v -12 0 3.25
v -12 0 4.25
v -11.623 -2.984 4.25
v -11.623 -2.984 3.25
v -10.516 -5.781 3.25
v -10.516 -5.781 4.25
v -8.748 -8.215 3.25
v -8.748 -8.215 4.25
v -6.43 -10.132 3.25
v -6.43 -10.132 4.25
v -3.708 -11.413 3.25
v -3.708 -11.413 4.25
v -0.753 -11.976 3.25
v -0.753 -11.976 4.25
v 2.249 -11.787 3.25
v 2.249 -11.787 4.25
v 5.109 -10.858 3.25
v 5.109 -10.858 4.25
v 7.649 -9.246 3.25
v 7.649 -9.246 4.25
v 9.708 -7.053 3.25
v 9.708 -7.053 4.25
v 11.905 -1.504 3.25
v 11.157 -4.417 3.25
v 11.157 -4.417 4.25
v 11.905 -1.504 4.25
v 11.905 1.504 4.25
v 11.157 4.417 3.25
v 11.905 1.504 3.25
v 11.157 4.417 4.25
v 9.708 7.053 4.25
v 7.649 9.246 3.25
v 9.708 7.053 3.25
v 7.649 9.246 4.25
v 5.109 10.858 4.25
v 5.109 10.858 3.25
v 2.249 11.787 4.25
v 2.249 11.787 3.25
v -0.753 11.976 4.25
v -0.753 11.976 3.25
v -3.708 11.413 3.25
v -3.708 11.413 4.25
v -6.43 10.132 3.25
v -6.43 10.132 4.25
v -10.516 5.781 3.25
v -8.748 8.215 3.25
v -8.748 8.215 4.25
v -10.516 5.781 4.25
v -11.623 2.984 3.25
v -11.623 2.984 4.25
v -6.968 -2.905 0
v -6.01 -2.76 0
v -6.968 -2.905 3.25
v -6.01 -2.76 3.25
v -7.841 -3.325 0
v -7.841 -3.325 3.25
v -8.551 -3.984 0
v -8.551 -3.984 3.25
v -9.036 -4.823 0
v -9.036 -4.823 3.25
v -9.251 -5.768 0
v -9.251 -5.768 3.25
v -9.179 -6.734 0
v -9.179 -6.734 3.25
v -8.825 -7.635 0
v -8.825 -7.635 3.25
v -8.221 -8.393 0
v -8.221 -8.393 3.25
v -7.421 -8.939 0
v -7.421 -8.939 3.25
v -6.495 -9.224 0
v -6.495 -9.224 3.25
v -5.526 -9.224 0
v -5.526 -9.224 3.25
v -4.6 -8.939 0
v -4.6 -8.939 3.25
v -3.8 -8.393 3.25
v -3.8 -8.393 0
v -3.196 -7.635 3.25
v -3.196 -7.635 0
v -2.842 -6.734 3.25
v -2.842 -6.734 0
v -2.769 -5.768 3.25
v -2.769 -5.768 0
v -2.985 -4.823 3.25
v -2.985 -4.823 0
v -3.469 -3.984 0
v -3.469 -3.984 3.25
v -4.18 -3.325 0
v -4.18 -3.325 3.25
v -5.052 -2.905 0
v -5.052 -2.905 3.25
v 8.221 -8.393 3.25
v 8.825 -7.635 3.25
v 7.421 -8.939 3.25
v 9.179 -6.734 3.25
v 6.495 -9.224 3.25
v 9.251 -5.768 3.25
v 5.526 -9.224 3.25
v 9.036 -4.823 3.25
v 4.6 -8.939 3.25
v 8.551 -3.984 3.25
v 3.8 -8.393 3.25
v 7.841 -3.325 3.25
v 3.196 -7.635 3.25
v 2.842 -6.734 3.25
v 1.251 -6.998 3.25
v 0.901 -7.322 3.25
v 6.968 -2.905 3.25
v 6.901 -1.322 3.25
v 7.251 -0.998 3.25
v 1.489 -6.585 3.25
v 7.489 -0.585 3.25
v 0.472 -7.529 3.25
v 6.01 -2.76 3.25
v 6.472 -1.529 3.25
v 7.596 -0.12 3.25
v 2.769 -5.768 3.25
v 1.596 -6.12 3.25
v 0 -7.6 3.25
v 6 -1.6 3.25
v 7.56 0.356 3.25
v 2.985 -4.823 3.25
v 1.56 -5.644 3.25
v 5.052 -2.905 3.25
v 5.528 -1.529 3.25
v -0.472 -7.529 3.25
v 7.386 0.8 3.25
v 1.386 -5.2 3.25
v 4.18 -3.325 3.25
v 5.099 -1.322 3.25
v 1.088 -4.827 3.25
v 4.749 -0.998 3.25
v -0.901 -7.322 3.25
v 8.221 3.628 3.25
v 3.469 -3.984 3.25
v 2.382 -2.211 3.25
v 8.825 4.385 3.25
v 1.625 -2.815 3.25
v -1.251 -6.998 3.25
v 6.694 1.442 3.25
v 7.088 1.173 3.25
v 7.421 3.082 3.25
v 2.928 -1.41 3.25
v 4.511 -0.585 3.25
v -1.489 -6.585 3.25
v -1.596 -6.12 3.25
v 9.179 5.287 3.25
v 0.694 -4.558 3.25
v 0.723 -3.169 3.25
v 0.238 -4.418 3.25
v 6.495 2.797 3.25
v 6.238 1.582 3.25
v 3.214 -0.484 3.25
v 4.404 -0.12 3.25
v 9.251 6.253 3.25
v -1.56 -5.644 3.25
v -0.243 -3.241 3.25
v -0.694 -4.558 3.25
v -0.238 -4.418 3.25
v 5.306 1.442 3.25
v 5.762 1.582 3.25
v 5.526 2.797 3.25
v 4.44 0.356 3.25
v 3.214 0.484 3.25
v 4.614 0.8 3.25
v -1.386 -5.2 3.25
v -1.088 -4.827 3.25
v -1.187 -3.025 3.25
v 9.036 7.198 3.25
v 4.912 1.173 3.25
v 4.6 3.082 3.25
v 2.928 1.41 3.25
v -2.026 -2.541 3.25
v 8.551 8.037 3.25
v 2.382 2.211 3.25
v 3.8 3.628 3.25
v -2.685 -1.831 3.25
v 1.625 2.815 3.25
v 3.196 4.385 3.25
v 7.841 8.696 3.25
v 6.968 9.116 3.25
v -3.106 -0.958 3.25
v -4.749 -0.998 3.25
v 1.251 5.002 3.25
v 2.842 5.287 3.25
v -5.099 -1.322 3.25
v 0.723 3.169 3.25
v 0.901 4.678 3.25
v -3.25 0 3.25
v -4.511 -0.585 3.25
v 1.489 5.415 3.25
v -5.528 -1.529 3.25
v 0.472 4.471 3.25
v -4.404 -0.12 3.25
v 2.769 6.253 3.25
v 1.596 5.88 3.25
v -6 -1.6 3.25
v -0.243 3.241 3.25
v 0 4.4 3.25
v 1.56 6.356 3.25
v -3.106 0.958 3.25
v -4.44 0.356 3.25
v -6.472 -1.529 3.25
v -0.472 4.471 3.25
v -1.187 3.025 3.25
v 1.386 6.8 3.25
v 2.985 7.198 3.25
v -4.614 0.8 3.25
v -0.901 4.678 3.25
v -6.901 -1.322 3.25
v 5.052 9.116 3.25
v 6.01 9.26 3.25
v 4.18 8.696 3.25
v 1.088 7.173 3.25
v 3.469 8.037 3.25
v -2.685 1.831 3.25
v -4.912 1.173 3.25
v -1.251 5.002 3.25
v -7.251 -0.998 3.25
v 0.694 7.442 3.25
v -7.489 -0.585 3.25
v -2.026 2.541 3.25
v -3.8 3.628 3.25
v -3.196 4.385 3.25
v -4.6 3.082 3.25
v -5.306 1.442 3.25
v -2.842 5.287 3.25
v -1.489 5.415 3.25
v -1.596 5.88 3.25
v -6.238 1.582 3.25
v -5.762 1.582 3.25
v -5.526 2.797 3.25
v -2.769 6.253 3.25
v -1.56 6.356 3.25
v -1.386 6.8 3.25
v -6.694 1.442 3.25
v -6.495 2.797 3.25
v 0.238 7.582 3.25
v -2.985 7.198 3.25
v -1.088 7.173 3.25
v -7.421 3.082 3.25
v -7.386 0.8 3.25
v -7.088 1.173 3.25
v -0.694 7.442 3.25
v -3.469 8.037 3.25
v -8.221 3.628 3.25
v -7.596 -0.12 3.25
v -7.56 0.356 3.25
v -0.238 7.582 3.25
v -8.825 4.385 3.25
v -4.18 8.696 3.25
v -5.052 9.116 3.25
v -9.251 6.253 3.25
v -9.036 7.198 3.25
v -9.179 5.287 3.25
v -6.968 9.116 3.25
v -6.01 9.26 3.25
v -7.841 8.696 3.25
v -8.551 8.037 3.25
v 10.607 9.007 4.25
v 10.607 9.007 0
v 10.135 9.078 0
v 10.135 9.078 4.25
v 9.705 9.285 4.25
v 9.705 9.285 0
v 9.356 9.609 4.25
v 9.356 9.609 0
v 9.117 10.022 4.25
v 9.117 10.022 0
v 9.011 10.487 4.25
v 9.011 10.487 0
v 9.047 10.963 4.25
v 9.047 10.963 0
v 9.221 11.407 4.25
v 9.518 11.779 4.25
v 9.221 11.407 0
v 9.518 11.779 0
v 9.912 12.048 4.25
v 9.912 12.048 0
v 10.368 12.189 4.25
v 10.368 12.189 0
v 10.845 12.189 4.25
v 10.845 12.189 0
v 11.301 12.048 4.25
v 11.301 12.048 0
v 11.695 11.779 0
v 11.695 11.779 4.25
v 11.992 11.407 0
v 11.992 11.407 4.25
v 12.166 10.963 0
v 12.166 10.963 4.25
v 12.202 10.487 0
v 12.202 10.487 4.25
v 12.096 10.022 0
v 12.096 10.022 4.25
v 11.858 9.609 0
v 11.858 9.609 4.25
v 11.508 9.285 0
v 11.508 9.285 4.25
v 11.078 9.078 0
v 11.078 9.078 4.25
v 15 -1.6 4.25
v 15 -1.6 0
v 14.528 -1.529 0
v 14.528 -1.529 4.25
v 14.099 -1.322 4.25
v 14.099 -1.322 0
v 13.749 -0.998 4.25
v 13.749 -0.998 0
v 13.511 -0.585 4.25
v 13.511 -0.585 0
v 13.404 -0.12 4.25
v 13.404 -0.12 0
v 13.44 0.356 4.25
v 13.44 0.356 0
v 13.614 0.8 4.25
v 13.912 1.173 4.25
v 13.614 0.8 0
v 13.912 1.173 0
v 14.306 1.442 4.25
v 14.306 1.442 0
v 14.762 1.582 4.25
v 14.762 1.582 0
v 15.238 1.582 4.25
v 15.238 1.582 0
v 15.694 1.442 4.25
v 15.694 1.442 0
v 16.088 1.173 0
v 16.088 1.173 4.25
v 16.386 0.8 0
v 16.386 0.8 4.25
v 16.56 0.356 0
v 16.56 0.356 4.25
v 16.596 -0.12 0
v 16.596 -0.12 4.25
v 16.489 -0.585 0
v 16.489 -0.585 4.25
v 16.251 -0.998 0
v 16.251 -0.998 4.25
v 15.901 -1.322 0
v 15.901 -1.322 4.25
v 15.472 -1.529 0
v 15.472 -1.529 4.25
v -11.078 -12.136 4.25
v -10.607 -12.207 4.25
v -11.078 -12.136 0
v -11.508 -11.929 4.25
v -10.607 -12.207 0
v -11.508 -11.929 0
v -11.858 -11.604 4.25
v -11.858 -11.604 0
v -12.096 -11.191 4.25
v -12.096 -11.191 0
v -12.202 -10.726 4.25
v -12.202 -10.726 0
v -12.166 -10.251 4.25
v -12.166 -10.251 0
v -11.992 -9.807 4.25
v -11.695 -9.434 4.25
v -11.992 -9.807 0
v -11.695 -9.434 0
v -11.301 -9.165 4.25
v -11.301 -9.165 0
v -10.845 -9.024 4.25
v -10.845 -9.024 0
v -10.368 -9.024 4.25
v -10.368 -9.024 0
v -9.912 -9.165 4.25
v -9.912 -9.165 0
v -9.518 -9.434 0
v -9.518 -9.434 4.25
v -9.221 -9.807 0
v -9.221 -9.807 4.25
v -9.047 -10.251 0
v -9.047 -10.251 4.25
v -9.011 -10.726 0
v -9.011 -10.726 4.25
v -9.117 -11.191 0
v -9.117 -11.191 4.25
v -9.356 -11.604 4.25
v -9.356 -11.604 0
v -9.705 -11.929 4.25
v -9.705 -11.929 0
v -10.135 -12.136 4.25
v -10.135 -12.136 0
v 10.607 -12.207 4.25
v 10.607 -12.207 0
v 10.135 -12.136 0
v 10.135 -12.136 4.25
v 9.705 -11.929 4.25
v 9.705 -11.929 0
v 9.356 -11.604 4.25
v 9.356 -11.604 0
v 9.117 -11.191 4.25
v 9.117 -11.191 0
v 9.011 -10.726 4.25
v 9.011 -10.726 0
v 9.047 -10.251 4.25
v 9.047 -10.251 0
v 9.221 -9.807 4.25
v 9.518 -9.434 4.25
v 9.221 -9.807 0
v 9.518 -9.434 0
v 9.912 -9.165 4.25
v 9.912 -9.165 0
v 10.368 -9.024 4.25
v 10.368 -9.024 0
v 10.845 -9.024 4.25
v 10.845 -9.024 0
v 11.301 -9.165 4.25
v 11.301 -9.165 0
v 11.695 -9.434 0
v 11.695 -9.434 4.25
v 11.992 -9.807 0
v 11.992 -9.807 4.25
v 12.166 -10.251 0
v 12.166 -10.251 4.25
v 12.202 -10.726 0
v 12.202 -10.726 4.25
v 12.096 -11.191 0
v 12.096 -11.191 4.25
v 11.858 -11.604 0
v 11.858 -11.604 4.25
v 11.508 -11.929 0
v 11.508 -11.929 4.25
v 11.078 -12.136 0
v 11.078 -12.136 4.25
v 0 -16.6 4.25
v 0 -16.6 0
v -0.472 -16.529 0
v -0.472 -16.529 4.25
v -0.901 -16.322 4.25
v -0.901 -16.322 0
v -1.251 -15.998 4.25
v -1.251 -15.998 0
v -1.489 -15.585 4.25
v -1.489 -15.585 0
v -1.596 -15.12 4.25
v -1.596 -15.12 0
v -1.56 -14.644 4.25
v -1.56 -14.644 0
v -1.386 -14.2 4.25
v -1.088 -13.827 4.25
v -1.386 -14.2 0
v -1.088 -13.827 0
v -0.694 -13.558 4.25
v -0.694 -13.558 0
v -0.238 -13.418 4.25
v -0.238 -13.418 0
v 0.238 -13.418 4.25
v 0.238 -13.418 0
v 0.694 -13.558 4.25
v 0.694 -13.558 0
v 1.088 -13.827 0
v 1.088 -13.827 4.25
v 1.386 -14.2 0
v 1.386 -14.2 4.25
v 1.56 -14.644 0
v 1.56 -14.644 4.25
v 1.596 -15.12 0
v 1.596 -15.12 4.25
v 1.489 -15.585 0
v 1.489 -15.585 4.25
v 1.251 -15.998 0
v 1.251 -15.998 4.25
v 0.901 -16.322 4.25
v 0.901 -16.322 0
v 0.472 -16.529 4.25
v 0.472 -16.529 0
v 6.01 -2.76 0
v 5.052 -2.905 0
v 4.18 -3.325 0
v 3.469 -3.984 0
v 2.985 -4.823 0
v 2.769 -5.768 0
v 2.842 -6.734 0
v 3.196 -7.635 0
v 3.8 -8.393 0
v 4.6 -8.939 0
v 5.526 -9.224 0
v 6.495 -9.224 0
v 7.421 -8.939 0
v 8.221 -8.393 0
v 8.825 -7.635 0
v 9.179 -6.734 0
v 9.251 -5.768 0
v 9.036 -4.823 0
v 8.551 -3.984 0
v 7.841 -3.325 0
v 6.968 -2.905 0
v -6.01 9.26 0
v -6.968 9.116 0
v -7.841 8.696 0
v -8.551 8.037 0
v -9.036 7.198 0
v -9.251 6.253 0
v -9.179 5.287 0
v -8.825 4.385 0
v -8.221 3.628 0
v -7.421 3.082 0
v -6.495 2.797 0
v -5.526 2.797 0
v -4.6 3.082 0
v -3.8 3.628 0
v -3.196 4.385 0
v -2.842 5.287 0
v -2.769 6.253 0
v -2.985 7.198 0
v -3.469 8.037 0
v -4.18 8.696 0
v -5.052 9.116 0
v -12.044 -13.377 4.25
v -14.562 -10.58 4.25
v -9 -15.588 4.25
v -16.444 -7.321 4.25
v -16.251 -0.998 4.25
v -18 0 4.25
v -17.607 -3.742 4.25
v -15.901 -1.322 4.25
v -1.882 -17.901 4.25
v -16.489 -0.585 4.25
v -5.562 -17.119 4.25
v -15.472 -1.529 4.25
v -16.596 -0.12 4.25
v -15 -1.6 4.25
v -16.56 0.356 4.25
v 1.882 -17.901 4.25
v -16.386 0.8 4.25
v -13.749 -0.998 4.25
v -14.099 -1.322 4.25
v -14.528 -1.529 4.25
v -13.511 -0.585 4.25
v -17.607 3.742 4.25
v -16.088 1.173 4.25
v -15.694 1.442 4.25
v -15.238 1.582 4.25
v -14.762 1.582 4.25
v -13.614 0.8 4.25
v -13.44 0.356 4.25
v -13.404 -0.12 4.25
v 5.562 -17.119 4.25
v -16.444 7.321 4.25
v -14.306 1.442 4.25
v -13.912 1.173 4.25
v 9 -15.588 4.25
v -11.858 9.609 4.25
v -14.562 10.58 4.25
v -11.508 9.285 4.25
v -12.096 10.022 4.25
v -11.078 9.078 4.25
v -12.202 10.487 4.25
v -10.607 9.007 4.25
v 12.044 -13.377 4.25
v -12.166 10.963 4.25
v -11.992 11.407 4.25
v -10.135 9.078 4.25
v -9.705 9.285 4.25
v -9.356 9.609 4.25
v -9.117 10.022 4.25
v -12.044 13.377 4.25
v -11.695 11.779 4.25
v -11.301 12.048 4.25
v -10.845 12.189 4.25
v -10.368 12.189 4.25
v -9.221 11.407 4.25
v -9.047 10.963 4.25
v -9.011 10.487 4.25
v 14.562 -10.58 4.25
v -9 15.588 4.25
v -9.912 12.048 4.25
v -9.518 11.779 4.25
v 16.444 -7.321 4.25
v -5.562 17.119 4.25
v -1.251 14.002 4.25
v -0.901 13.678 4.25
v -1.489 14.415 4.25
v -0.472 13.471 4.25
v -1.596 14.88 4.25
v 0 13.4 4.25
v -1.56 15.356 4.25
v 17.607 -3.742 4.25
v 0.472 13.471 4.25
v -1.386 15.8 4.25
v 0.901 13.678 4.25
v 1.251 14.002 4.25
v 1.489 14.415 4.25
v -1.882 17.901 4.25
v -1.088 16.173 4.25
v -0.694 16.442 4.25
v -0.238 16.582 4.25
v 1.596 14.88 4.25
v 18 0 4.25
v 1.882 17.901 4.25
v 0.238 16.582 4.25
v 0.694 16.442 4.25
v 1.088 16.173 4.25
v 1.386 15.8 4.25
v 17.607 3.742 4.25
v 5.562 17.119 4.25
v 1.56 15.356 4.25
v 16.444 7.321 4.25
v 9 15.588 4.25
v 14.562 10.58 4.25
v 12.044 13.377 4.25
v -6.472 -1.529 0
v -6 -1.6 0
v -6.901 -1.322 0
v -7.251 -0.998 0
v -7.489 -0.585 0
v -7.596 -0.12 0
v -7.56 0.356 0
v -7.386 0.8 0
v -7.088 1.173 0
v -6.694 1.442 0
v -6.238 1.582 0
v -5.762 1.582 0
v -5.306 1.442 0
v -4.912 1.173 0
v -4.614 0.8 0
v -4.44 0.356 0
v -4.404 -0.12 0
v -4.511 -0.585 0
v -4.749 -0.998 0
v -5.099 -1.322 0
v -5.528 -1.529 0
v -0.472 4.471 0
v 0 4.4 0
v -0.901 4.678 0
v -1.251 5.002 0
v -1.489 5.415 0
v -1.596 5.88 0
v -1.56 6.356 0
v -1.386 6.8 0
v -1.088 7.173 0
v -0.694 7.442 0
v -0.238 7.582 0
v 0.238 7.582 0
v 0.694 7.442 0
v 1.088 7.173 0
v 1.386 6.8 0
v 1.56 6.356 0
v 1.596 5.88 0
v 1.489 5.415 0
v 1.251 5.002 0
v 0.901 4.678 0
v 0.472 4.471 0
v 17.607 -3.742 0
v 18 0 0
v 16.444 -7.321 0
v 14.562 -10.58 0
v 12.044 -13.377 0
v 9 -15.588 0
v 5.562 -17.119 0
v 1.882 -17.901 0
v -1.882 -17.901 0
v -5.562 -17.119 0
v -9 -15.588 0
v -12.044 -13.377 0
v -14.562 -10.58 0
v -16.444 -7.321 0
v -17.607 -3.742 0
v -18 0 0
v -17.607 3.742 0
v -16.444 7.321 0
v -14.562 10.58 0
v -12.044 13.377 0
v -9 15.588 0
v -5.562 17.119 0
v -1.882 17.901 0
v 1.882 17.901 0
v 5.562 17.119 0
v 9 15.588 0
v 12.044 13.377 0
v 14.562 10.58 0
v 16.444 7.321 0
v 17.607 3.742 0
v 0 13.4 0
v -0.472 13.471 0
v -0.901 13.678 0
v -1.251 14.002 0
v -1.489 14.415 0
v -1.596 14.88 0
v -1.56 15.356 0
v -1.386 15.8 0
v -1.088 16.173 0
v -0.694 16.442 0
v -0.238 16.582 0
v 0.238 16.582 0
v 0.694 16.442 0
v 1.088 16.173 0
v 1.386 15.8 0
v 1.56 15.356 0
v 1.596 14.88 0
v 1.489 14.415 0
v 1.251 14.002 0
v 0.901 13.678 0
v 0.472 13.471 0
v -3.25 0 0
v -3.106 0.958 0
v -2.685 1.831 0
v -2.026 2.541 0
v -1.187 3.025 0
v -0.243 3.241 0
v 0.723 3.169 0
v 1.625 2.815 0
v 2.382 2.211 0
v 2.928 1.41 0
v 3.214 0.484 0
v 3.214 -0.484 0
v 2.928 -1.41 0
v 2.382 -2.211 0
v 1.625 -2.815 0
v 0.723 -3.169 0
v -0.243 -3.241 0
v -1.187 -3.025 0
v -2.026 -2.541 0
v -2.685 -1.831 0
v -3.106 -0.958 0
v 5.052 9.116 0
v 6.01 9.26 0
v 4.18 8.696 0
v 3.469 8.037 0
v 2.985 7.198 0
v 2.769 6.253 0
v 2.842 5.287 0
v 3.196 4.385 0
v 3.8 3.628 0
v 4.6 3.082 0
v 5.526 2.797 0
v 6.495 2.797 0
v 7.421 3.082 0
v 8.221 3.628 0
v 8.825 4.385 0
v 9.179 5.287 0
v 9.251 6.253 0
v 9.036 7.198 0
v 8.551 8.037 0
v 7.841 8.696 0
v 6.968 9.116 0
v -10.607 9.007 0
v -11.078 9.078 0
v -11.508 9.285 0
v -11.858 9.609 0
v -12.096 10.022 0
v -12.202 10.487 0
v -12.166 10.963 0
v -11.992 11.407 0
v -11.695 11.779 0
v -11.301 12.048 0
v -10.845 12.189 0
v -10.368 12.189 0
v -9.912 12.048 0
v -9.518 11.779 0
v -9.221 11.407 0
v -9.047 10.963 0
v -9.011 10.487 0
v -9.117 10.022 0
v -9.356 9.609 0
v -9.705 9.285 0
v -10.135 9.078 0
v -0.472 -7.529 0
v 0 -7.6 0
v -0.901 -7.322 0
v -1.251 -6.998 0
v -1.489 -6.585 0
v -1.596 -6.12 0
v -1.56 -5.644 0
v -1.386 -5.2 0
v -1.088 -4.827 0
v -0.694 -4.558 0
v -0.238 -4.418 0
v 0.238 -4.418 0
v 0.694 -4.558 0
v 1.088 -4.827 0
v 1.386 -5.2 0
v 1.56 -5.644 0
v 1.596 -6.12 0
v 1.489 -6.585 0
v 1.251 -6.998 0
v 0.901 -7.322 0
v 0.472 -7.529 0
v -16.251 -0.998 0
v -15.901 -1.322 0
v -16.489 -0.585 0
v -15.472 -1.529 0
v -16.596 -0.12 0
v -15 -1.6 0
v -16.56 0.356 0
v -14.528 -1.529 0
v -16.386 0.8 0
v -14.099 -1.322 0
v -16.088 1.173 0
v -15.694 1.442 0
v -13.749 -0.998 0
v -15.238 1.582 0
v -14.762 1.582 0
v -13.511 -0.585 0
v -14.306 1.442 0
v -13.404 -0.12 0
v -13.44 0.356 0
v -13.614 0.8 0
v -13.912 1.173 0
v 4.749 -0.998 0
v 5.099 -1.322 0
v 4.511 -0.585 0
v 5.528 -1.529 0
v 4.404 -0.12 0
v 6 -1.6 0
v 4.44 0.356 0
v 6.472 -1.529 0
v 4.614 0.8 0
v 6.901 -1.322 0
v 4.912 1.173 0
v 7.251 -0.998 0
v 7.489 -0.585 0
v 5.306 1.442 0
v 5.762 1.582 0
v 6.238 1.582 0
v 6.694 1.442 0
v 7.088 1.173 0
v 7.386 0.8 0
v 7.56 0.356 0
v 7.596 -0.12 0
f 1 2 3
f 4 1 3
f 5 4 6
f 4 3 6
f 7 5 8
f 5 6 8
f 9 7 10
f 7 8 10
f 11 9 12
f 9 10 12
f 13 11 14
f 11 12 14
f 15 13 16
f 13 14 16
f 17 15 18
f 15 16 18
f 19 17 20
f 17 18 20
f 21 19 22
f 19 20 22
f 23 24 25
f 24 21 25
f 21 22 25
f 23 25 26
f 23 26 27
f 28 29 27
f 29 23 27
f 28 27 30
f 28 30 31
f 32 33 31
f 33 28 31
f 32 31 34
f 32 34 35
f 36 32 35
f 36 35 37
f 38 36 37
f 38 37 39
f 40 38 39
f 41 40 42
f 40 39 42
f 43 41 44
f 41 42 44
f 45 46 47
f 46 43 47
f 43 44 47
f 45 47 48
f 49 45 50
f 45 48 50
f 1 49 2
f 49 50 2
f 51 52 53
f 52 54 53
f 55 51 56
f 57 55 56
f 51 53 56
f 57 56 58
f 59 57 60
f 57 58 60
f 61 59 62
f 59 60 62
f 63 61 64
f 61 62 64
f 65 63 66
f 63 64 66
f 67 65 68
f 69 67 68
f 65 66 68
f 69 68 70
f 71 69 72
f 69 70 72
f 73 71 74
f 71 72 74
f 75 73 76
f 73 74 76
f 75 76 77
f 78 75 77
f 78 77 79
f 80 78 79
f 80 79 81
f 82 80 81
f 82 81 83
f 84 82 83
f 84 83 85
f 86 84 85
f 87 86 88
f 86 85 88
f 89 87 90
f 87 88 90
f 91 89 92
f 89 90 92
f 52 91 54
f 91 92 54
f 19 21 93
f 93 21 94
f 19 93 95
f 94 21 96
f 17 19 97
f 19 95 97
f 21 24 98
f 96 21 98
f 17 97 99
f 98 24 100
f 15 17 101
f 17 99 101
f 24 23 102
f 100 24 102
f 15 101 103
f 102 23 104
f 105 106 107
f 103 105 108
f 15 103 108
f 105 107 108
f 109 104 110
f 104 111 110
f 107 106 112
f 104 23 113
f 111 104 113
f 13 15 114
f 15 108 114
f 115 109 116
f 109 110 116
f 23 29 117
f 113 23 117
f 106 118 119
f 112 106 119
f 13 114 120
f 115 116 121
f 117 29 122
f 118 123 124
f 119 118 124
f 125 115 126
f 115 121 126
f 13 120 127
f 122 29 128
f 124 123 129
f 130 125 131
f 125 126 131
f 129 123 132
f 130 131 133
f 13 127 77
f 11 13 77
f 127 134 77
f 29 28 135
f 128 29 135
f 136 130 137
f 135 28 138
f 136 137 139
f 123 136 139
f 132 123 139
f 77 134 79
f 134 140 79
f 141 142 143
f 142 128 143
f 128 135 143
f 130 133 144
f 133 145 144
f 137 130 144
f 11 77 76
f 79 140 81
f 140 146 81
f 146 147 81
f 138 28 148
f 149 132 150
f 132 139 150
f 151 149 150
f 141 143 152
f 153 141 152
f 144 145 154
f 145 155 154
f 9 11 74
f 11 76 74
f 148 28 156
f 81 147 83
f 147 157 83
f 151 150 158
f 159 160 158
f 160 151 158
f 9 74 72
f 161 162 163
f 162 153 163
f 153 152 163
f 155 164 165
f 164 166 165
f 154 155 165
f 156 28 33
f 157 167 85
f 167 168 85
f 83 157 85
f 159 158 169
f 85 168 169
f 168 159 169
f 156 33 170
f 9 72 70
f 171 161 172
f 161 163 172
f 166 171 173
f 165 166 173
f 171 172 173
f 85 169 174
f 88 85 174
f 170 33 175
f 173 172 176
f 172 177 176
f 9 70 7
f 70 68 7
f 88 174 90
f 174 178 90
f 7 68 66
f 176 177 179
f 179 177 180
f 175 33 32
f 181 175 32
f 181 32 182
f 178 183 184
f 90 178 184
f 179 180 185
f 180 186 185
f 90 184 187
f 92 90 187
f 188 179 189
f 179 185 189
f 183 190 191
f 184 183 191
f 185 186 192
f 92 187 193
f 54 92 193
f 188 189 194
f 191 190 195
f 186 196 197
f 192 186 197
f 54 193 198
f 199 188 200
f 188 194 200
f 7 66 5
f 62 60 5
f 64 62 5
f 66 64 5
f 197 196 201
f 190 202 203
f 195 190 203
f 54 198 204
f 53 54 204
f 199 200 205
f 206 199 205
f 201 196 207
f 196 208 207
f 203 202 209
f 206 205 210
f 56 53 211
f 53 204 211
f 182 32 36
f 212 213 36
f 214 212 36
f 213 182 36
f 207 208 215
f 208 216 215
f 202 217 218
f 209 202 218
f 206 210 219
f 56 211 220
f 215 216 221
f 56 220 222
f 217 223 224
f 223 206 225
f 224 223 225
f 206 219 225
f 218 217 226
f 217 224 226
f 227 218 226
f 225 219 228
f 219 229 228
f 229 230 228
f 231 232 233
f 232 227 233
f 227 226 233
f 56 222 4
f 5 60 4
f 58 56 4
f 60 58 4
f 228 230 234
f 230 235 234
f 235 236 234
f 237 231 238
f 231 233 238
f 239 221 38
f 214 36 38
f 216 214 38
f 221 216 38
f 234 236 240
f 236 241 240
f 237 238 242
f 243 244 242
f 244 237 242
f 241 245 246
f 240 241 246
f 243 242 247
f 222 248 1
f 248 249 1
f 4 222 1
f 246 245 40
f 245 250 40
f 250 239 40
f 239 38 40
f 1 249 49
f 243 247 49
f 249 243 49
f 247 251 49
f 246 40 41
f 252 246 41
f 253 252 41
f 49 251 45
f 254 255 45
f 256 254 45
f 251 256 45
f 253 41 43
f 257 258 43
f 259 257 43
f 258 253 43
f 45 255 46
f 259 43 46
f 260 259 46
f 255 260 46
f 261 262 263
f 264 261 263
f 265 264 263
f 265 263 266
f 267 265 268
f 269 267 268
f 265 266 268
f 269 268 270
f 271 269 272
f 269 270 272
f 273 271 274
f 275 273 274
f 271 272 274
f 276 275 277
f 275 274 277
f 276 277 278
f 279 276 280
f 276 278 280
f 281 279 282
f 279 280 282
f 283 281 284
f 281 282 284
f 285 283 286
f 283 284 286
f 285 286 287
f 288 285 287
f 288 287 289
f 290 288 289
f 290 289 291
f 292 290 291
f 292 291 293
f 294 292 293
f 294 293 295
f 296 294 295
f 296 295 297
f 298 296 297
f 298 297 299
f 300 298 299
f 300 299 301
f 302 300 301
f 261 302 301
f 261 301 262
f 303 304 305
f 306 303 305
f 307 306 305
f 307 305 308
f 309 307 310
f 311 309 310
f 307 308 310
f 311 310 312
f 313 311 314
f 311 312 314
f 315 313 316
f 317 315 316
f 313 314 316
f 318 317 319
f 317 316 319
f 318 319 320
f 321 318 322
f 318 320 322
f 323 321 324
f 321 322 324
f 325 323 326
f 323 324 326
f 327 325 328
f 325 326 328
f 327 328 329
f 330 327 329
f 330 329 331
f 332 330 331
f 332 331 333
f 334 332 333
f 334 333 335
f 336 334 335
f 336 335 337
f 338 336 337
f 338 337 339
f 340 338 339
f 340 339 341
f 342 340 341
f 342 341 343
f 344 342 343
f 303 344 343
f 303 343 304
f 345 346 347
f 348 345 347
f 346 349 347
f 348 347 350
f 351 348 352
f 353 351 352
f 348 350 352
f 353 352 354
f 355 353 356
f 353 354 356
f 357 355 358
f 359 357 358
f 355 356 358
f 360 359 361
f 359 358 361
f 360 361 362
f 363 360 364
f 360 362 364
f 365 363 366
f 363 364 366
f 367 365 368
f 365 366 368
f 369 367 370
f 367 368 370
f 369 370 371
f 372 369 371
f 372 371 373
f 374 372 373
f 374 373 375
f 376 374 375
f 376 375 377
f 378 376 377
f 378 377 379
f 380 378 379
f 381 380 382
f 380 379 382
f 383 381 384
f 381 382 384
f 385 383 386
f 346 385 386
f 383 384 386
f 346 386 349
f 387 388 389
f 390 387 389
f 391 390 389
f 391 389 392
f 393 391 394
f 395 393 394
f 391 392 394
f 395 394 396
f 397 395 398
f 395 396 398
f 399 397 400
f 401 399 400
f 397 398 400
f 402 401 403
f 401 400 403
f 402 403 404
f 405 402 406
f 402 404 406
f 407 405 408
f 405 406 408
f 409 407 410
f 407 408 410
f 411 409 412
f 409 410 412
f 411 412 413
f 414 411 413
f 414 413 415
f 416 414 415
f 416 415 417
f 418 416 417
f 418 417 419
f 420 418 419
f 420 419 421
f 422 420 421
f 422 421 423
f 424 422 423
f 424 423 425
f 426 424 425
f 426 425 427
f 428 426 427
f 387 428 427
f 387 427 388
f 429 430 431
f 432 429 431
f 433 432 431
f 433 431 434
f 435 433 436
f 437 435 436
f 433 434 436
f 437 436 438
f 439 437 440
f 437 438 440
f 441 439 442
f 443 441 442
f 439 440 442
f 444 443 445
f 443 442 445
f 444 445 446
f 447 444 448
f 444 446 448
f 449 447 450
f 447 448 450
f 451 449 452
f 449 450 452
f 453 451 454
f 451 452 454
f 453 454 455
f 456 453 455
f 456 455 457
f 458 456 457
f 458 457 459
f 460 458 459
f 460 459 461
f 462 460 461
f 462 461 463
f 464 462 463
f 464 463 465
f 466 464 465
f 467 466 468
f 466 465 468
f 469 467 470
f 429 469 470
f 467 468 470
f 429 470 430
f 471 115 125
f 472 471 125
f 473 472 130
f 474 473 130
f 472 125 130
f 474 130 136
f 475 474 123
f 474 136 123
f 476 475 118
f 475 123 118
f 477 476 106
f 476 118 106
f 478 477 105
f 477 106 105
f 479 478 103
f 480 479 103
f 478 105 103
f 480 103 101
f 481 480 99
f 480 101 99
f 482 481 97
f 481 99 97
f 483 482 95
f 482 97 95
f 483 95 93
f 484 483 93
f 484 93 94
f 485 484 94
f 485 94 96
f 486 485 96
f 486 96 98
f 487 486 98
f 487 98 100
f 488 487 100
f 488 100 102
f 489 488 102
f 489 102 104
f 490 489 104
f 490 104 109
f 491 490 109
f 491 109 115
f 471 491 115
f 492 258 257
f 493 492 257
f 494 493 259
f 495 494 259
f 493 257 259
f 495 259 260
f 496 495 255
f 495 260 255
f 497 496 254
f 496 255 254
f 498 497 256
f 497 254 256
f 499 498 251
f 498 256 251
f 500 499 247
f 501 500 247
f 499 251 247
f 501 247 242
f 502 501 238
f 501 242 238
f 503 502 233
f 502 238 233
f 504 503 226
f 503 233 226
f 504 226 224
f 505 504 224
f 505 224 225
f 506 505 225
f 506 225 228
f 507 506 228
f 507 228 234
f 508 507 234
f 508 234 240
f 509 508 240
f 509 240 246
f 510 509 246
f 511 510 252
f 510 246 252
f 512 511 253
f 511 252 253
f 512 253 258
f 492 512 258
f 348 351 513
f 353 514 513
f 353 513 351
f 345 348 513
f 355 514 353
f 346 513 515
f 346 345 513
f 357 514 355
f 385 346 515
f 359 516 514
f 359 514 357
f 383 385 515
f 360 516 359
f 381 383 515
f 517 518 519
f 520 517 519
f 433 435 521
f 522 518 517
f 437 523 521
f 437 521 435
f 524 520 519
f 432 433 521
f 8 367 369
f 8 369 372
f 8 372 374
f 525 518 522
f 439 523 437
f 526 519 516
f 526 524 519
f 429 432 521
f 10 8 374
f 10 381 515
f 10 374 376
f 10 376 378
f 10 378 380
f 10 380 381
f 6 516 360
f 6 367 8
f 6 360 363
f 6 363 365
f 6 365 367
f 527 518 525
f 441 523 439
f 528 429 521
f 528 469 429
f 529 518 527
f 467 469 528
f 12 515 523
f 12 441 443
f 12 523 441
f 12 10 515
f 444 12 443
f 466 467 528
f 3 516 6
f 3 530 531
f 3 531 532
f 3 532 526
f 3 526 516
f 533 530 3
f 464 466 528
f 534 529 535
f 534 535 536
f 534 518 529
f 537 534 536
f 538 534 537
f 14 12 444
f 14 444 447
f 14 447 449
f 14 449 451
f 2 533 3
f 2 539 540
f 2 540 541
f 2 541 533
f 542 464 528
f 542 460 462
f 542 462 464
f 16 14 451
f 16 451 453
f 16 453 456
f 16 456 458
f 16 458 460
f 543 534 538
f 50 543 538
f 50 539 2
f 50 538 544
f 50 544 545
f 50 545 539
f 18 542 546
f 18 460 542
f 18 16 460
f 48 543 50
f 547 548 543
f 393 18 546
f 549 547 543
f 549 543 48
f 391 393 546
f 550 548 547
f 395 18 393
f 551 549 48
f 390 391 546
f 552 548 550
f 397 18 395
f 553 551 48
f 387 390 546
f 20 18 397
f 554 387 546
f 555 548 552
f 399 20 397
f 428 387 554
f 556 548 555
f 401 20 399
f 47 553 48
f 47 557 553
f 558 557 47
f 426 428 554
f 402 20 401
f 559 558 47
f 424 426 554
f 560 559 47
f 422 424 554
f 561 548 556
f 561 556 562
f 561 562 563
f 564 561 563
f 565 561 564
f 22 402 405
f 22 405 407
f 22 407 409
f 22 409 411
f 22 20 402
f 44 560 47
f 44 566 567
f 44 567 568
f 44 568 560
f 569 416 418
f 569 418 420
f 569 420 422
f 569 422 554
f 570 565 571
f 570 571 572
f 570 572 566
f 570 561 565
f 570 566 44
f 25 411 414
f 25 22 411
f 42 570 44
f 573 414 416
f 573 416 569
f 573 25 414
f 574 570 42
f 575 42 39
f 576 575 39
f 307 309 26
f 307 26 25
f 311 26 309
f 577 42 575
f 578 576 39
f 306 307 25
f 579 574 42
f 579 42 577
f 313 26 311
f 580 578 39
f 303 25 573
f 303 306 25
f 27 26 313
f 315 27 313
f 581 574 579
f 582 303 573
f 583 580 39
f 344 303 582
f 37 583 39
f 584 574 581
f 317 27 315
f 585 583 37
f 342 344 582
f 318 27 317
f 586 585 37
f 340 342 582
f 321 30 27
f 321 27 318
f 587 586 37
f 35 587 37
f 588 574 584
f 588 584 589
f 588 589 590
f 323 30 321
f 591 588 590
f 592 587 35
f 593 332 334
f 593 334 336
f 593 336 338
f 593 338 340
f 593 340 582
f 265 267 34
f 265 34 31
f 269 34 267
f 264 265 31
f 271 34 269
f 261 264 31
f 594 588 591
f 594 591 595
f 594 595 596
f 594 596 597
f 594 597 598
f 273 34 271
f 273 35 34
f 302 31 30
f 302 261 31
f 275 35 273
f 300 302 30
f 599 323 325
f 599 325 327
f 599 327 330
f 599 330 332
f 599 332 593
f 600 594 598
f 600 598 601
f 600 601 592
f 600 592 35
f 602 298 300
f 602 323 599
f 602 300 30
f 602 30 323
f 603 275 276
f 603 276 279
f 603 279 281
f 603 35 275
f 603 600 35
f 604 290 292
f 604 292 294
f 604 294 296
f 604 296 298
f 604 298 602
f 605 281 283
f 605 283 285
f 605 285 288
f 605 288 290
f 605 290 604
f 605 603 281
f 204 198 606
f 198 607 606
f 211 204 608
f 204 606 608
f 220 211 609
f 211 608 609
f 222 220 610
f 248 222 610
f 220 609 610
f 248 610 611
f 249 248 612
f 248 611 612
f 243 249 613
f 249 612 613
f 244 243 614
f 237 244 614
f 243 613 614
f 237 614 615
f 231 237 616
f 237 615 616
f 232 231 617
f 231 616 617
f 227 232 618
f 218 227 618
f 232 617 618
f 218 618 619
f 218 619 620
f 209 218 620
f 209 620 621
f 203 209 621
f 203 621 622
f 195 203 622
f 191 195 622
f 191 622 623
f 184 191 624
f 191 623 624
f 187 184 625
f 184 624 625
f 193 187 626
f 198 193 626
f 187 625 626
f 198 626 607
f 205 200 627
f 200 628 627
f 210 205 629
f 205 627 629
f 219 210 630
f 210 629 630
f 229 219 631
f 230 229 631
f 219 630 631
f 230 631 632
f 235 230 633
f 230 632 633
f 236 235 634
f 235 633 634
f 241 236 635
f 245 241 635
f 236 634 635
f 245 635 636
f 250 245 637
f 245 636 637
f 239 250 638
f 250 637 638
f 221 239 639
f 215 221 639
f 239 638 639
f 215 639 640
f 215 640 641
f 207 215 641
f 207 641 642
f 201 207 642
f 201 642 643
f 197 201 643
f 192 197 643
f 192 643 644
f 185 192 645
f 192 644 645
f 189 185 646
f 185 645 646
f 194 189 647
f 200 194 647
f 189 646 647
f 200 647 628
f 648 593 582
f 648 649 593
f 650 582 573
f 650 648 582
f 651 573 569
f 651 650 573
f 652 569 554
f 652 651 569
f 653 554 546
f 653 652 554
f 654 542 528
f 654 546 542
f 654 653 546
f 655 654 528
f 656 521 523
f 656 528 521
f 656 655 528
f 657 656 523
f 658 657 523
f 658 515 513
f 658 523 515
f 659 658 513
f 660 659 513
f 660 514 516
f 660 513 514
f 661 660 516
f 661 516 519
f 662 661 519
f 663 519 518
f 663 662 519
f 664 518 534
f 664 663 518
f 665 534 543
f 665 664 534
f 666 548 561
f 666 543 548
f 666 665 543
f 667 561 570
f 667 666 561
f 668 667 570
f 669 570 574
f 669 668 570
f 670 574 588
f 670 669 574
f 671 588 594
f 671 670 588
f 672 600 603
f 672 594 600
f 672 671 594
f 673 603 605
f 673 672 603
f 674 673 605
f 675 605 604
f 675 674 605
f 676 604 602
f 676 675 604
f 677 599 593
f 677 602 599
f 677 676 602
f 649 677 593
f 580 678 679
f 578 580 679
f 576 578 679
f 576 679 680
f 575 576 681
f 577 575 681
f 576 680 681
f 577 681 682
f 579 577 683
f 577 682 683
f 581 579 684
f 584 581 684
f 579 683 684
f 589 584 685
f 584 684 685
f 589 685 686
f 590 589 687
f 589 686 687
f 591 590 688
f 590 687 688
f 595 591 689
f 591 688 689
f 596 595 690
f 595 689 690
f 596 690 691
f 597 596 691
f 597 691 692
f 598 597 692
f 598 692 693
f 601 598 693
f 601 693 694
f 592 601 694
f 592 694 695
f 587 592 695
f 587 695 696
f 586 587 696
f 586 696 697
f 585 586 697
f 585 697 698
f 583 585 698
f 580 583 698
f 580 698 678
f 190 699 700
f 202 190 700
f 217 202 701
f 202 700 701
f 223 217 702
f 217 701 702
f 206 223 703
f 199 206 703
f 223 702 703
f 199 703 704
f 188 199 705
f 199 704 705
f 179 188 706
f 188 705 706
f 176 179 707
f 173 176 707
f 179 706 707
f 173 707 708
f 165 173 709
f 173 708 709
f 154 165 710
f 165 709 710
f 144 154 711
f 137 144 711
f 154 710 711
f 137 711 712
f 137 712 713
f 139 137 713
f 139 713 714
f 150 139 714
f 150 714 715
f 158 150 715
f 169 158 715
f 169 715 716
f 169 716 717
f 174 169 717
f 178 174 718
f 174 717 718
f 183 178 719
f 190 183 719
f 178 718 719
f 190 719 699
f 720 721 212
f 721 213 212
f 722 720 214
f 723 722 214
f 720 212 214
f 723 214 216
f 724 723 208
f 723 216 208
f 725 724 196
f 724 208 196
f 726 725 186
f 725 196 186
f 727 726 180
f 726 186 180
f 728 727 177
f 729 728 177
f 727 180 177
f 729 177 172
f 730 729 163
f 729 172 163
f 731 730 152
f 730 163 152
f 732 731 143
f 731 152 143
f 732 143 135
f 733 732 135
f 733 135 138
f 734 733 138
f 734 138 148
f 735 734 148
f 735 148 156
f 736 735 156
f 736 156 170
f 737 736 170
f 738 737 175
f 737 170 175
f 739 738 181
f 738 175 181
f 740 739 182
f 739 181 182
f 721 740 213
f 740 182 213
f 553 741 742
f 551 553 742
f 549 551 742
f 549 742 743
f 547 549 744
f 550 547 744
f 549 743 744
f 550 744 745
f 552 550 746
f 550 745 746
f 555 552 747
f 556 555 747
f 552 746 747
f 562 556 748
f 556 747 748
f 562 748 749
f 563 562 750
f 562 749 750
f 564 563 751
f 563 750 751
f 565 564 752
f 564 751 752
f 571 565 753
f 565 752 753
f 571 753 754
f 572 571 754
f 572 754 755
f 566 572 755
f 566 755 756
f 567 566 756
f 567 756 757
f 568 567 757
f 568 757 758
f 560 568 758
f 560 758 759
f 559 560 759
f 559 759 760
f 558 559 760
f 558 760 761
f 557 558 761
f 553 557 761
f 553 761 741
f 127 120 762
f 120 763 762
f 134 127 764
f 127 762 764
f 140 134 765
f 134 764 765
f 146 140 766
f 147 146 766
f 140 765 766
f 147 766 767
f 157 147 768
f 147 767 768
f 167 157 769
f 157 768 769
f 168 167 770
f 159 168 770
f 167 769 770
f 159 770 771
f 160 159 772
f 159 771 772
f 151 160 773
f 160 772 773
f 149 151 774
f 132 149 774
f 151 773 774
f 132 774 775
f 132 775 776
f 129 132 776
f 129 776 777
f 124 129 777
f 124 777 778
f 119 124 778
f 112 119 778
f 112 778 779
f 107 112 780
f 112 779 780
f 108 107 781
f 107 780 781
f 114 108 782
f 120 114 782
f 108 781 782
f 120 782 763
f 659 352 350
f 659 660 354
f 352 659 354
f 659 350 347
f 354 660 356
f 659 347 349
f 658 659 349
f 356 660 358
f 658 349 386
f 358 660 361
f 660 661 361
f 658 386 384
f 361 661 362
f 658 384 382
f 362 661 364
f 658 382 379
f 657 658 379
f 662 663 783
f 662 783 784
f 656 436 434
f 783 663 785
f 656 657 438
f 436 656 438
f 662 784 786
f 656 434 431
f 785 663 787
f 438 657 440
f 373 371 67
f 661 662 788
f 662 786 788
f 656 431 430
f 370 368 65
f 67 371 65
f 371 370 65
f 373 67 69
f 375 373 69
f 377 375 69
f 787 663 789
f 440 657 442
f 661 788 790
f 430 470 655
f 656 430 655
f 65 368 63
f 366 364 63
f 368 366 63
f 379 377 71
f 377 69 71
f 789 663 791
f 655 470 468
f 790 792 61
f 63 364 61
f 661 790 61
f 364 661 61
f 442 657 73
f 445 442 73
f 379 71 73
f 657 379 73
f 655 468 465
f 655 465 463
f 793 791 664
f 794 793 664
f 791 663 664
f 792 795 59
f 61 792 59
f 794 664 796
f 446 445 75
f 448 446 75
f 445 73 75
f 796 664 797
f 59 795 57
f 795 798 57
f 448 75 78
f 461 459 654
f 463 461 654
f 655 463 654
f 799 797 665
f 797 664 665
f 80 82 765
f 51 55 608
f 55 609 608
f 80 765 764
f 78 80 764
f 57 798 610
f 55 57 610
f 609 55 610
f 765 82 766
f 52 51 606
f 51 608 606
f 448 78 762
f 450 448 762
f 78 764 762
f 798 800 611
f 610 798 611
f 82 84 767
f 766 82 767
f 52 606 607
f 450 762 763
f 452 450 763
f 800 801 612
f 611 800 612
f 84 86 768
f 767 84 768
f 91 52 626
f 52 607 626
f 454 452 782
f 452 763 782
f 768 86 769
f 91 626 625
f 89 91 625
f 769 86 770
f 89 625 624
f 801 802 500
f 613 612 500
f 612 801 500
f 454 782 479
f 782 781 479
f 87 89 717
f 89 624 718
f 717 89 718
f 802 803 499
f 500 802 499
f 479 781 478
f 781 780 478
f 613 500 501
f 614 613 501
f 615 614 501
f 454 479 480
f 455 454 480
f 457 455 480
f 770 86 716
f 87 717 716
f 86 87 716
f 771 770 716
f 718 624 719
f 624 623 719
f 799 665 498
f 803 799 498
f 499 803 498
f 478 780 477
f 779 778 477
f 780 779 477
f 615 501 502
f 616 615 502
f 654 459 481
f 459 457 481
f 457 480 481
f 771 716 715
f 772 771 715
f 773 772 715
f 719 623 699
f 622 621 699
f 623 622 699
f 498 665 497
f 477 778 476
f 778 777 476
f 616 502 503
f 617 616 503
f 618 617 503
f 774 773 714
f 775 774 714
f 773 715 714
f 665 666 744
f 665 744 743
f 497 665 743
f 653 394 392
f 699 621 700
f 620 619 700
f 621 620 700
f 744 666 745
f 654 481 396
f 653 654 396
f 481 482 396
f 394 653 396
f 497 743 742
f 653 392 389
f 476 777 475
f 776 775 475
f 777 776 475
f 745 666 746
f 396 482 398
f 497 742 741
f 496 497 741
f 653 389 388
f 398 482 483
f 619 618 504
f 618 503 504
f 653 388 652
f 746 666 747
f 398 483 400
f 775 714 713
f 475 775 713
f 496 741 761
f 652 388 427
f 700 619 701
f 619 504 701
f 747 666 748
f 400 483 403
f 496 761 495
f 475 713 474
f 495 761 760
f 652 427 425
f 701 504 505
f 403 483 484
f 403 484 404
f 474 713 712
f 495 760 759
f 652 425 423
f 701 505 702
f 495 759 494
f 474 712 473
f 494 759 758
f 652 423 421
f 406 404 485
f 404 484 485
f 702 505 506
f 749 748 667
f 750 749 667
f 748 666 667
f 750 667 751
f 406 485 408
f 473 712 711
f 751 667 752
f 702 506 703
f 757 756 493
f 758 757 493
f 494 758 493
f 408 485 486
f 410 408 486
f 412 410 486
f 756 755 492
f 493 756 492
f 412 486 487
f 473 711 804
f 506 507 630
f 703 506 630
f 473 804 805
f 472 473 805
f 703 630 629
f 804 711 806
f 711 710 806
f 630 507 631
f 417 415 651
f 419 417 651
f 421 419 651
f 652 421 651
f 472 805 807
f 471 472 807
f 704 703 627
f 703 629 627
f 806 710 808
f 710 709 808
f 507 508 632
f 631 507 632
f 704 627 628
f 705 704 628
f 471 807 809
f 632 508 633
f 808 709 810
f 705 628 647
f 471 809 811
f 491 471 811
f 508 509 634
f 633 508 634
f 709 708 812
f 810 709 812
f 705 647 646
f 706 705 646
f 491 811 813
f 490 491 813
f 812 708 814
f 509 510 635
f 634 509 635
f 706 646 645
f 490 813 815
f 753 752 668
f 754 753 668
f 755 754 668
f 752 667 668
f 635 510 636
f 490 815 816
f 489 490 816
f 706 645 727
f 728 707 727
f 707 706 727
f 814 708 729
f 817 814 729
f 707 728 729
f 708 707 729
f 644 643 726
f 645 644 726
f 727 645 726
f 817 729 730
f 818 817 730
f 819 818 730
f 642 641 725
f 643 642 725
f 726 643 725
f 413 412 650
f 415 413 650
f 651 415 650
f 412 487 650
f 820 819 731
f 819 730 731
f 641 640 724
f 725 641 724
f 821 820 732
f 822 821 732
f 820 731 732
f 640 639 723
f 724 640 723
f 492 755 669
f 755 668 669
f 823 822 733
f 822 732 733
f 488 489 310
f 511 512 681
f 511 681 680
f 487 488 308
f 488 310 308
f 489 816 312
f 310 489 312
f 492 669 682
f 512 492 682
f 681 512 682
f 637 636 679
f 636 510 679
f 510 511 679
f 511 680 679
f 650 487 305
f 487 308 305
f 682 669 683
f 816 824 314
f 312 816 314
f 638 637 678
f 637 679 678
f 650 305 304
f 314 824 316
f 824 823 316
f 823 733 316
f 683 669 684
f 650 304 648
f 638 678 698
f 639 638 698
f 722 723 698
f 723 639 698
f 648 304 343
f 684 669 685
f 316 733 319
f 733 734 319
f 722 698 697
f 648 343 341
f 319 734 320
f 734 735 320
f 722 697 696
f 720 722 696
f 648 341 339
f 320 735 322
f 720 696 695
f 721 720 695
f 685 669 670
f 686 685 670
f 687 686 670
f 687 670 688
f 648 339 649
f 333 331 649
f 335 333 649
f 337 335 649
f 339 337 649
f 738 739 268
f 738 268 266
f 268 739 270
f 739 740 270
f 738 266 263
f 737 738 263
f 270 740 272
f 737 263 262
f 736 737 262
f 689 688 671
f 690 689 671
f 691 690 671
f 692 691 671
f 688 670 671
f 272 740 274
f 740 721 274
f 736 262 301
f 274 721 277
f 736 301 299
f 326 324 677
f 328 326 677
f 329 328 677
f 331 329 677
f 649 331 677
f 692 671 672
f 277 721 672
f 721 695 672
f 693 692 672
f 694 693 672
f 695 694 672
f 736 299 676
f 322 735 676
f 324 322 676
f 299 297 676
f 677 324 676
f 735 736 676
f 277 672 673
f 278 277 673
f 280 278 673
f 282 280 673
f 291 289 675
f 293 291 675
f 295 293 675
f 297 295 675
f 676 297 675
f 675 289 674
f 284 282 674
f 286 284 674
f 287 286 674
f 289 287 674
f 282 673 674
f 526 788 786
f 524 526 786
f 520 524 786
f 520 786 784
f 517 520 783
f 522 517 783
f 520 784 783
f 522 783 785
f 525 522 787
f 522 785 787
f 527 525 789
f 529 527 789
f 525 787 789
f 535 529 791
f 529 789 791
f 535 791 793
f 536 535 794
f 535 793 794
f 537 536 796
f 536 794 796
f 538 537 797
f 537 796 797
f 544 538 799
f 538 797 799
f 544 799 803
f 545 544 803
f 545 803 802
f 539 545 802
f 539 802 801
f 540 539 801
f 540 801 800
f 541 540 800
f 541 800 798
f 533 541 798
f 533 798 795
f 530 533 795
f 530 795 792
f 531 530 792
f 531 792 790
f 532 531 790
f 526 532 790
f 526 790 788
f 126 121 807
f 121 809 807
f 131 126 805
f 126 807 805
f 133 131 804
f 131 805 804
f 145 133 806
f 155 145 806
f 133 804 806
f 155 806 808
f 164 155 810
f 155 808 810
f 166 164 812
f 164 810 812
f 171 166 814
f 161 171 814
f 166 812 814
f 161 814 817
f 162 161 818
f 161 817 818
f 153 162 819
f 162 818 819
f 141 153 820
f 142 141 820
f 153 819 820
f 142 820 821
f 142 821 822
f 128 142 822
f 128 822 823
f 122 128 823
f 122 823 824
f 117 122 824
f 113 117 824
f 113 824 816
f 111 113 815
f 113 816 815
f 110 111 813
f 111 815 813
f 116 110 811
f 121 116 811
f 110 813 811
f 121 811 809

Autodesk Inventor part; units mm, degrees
ref_plane "YZ Plane" through (0, 0, 0) normal (1, 0, 0) x (0, 1, 0)
ref_plane "XZ Plane" through (0, 0, 0) normal (0, 1, 0) x (-1, 0, 0)
ref_plane "XY Plane" through (0, 0, 0) normal (0, 0, 1) x (1, 0, 0)
sketch "スケッチ1" plane through (0, 0, 0) normal (0, 0, 1) x (1, 0, 0)
  circle A0 centre (0, 0) radius 18
  dimension "d0" = 36
extrude "押し出し1" add sketch "スケッチ1" along normal blind 4.25
sketch "スケッチ2" plane through (0, 0, 4.25) normal (0, 0, 1) x (1, 0, 0)
  circle A0 centre (0, 0) radius 6
  point P0 (0, 6)
  point P1 (-6, 0)
  point P2 (0, -6)
  point P3 (6, 0)
  dimension "d3" = 12
  dimension "d6" = 360
hole "穴1" at (0, 6, 4.25) at (-6, 0, 4.25) at (0, -6, 4.25) at (6, 0, 4.25) direction (0, 0, -1) diameter 3.2 end through all clearance for "Socket Head Cap Screw" size "M3" standard "Ansi Metric M Profile"
sketch "スケッチ3" plane through (0, 0, 0) normal (0, 0, -1) x (-1, 0, 0)
  circle A0 centre (0, 0) radius 8.5
  point P0 (-6.0104, 6.0104)
  point P1 (-6.0104, -6.0104)
  point P2 (6.0104, -6.0104)
  point P3 (6.0104, 6.0104)
  dimension "d15" = 17
  dimension "d18" = 360
hole "穴2" at (6.0104, 6.0104, 0) at (6.0104, -6.0104, 0) at (-6.0104, -6.0104, 0) at (-6.0104, 6.0104, 0) direction (0, 0, 1) diameter 3.2 end through all counterbore diameter 6.5 counterbore depth 10 clearance for "Socket Head Cap Screw" size "M3" standard "Ansi Metric M Profile"
sketch "スケッチ4" plane through (0, 0, 0) normal (0, 0, -1) x (-1, 0, 0)
  circle A0 centre (0, 0) radius 3.25
  dimension "d27" = 6.5
extrude "押し出し2" cut sketch "スケッチ4" against normal blind 8
sketch "スケッチ5" plane through (0, 0, 4.25) normal (0, 0, 1) x (1, 0, 0)
  circle A0 centre (0, 0) radius 15
  point P0 (0, -15)
  point P1 (10.6066, -10.6066)
  point P2 (15, 0)
  point P3 (10.6066, 10.6066)
  point P4 (0, 15)
  point P5 (-10.6066, 10.6066)
  point P6 (-15, 0)
  point P7 (-10.6066, -10.6066)
  dimension "d31" = 30
  dimension "d34" = 360
hole "穴3" at (0, -15, 4.25) at (10.6066, -10.6066, 4.25) at (15, 0, 4.25) at (10.6066, 10.6066, 4.25) at (0, 15, 4.25) at (-10.6066, 10.6066, 4.25) at (-15, 0, 4.25) at (-10.6066, -10.6066, 4.25) direction (0, 0, -1) diameter 3.2 end through all clearance for "Socket Head Cap Screw" size "M3" standard "Ansi Metric M Profile"
sketch "スケッチ6" plane through (0, 0, 4.25) normal (0, 0, -1) x (-1, 0, 0)
  circle A0 centre (0, 0) radius 12
  dimension "d43" = 24
extrude "押し出し3" cut sketch "スケッチ6" along normal blind 1
properties part number "s_base6"
